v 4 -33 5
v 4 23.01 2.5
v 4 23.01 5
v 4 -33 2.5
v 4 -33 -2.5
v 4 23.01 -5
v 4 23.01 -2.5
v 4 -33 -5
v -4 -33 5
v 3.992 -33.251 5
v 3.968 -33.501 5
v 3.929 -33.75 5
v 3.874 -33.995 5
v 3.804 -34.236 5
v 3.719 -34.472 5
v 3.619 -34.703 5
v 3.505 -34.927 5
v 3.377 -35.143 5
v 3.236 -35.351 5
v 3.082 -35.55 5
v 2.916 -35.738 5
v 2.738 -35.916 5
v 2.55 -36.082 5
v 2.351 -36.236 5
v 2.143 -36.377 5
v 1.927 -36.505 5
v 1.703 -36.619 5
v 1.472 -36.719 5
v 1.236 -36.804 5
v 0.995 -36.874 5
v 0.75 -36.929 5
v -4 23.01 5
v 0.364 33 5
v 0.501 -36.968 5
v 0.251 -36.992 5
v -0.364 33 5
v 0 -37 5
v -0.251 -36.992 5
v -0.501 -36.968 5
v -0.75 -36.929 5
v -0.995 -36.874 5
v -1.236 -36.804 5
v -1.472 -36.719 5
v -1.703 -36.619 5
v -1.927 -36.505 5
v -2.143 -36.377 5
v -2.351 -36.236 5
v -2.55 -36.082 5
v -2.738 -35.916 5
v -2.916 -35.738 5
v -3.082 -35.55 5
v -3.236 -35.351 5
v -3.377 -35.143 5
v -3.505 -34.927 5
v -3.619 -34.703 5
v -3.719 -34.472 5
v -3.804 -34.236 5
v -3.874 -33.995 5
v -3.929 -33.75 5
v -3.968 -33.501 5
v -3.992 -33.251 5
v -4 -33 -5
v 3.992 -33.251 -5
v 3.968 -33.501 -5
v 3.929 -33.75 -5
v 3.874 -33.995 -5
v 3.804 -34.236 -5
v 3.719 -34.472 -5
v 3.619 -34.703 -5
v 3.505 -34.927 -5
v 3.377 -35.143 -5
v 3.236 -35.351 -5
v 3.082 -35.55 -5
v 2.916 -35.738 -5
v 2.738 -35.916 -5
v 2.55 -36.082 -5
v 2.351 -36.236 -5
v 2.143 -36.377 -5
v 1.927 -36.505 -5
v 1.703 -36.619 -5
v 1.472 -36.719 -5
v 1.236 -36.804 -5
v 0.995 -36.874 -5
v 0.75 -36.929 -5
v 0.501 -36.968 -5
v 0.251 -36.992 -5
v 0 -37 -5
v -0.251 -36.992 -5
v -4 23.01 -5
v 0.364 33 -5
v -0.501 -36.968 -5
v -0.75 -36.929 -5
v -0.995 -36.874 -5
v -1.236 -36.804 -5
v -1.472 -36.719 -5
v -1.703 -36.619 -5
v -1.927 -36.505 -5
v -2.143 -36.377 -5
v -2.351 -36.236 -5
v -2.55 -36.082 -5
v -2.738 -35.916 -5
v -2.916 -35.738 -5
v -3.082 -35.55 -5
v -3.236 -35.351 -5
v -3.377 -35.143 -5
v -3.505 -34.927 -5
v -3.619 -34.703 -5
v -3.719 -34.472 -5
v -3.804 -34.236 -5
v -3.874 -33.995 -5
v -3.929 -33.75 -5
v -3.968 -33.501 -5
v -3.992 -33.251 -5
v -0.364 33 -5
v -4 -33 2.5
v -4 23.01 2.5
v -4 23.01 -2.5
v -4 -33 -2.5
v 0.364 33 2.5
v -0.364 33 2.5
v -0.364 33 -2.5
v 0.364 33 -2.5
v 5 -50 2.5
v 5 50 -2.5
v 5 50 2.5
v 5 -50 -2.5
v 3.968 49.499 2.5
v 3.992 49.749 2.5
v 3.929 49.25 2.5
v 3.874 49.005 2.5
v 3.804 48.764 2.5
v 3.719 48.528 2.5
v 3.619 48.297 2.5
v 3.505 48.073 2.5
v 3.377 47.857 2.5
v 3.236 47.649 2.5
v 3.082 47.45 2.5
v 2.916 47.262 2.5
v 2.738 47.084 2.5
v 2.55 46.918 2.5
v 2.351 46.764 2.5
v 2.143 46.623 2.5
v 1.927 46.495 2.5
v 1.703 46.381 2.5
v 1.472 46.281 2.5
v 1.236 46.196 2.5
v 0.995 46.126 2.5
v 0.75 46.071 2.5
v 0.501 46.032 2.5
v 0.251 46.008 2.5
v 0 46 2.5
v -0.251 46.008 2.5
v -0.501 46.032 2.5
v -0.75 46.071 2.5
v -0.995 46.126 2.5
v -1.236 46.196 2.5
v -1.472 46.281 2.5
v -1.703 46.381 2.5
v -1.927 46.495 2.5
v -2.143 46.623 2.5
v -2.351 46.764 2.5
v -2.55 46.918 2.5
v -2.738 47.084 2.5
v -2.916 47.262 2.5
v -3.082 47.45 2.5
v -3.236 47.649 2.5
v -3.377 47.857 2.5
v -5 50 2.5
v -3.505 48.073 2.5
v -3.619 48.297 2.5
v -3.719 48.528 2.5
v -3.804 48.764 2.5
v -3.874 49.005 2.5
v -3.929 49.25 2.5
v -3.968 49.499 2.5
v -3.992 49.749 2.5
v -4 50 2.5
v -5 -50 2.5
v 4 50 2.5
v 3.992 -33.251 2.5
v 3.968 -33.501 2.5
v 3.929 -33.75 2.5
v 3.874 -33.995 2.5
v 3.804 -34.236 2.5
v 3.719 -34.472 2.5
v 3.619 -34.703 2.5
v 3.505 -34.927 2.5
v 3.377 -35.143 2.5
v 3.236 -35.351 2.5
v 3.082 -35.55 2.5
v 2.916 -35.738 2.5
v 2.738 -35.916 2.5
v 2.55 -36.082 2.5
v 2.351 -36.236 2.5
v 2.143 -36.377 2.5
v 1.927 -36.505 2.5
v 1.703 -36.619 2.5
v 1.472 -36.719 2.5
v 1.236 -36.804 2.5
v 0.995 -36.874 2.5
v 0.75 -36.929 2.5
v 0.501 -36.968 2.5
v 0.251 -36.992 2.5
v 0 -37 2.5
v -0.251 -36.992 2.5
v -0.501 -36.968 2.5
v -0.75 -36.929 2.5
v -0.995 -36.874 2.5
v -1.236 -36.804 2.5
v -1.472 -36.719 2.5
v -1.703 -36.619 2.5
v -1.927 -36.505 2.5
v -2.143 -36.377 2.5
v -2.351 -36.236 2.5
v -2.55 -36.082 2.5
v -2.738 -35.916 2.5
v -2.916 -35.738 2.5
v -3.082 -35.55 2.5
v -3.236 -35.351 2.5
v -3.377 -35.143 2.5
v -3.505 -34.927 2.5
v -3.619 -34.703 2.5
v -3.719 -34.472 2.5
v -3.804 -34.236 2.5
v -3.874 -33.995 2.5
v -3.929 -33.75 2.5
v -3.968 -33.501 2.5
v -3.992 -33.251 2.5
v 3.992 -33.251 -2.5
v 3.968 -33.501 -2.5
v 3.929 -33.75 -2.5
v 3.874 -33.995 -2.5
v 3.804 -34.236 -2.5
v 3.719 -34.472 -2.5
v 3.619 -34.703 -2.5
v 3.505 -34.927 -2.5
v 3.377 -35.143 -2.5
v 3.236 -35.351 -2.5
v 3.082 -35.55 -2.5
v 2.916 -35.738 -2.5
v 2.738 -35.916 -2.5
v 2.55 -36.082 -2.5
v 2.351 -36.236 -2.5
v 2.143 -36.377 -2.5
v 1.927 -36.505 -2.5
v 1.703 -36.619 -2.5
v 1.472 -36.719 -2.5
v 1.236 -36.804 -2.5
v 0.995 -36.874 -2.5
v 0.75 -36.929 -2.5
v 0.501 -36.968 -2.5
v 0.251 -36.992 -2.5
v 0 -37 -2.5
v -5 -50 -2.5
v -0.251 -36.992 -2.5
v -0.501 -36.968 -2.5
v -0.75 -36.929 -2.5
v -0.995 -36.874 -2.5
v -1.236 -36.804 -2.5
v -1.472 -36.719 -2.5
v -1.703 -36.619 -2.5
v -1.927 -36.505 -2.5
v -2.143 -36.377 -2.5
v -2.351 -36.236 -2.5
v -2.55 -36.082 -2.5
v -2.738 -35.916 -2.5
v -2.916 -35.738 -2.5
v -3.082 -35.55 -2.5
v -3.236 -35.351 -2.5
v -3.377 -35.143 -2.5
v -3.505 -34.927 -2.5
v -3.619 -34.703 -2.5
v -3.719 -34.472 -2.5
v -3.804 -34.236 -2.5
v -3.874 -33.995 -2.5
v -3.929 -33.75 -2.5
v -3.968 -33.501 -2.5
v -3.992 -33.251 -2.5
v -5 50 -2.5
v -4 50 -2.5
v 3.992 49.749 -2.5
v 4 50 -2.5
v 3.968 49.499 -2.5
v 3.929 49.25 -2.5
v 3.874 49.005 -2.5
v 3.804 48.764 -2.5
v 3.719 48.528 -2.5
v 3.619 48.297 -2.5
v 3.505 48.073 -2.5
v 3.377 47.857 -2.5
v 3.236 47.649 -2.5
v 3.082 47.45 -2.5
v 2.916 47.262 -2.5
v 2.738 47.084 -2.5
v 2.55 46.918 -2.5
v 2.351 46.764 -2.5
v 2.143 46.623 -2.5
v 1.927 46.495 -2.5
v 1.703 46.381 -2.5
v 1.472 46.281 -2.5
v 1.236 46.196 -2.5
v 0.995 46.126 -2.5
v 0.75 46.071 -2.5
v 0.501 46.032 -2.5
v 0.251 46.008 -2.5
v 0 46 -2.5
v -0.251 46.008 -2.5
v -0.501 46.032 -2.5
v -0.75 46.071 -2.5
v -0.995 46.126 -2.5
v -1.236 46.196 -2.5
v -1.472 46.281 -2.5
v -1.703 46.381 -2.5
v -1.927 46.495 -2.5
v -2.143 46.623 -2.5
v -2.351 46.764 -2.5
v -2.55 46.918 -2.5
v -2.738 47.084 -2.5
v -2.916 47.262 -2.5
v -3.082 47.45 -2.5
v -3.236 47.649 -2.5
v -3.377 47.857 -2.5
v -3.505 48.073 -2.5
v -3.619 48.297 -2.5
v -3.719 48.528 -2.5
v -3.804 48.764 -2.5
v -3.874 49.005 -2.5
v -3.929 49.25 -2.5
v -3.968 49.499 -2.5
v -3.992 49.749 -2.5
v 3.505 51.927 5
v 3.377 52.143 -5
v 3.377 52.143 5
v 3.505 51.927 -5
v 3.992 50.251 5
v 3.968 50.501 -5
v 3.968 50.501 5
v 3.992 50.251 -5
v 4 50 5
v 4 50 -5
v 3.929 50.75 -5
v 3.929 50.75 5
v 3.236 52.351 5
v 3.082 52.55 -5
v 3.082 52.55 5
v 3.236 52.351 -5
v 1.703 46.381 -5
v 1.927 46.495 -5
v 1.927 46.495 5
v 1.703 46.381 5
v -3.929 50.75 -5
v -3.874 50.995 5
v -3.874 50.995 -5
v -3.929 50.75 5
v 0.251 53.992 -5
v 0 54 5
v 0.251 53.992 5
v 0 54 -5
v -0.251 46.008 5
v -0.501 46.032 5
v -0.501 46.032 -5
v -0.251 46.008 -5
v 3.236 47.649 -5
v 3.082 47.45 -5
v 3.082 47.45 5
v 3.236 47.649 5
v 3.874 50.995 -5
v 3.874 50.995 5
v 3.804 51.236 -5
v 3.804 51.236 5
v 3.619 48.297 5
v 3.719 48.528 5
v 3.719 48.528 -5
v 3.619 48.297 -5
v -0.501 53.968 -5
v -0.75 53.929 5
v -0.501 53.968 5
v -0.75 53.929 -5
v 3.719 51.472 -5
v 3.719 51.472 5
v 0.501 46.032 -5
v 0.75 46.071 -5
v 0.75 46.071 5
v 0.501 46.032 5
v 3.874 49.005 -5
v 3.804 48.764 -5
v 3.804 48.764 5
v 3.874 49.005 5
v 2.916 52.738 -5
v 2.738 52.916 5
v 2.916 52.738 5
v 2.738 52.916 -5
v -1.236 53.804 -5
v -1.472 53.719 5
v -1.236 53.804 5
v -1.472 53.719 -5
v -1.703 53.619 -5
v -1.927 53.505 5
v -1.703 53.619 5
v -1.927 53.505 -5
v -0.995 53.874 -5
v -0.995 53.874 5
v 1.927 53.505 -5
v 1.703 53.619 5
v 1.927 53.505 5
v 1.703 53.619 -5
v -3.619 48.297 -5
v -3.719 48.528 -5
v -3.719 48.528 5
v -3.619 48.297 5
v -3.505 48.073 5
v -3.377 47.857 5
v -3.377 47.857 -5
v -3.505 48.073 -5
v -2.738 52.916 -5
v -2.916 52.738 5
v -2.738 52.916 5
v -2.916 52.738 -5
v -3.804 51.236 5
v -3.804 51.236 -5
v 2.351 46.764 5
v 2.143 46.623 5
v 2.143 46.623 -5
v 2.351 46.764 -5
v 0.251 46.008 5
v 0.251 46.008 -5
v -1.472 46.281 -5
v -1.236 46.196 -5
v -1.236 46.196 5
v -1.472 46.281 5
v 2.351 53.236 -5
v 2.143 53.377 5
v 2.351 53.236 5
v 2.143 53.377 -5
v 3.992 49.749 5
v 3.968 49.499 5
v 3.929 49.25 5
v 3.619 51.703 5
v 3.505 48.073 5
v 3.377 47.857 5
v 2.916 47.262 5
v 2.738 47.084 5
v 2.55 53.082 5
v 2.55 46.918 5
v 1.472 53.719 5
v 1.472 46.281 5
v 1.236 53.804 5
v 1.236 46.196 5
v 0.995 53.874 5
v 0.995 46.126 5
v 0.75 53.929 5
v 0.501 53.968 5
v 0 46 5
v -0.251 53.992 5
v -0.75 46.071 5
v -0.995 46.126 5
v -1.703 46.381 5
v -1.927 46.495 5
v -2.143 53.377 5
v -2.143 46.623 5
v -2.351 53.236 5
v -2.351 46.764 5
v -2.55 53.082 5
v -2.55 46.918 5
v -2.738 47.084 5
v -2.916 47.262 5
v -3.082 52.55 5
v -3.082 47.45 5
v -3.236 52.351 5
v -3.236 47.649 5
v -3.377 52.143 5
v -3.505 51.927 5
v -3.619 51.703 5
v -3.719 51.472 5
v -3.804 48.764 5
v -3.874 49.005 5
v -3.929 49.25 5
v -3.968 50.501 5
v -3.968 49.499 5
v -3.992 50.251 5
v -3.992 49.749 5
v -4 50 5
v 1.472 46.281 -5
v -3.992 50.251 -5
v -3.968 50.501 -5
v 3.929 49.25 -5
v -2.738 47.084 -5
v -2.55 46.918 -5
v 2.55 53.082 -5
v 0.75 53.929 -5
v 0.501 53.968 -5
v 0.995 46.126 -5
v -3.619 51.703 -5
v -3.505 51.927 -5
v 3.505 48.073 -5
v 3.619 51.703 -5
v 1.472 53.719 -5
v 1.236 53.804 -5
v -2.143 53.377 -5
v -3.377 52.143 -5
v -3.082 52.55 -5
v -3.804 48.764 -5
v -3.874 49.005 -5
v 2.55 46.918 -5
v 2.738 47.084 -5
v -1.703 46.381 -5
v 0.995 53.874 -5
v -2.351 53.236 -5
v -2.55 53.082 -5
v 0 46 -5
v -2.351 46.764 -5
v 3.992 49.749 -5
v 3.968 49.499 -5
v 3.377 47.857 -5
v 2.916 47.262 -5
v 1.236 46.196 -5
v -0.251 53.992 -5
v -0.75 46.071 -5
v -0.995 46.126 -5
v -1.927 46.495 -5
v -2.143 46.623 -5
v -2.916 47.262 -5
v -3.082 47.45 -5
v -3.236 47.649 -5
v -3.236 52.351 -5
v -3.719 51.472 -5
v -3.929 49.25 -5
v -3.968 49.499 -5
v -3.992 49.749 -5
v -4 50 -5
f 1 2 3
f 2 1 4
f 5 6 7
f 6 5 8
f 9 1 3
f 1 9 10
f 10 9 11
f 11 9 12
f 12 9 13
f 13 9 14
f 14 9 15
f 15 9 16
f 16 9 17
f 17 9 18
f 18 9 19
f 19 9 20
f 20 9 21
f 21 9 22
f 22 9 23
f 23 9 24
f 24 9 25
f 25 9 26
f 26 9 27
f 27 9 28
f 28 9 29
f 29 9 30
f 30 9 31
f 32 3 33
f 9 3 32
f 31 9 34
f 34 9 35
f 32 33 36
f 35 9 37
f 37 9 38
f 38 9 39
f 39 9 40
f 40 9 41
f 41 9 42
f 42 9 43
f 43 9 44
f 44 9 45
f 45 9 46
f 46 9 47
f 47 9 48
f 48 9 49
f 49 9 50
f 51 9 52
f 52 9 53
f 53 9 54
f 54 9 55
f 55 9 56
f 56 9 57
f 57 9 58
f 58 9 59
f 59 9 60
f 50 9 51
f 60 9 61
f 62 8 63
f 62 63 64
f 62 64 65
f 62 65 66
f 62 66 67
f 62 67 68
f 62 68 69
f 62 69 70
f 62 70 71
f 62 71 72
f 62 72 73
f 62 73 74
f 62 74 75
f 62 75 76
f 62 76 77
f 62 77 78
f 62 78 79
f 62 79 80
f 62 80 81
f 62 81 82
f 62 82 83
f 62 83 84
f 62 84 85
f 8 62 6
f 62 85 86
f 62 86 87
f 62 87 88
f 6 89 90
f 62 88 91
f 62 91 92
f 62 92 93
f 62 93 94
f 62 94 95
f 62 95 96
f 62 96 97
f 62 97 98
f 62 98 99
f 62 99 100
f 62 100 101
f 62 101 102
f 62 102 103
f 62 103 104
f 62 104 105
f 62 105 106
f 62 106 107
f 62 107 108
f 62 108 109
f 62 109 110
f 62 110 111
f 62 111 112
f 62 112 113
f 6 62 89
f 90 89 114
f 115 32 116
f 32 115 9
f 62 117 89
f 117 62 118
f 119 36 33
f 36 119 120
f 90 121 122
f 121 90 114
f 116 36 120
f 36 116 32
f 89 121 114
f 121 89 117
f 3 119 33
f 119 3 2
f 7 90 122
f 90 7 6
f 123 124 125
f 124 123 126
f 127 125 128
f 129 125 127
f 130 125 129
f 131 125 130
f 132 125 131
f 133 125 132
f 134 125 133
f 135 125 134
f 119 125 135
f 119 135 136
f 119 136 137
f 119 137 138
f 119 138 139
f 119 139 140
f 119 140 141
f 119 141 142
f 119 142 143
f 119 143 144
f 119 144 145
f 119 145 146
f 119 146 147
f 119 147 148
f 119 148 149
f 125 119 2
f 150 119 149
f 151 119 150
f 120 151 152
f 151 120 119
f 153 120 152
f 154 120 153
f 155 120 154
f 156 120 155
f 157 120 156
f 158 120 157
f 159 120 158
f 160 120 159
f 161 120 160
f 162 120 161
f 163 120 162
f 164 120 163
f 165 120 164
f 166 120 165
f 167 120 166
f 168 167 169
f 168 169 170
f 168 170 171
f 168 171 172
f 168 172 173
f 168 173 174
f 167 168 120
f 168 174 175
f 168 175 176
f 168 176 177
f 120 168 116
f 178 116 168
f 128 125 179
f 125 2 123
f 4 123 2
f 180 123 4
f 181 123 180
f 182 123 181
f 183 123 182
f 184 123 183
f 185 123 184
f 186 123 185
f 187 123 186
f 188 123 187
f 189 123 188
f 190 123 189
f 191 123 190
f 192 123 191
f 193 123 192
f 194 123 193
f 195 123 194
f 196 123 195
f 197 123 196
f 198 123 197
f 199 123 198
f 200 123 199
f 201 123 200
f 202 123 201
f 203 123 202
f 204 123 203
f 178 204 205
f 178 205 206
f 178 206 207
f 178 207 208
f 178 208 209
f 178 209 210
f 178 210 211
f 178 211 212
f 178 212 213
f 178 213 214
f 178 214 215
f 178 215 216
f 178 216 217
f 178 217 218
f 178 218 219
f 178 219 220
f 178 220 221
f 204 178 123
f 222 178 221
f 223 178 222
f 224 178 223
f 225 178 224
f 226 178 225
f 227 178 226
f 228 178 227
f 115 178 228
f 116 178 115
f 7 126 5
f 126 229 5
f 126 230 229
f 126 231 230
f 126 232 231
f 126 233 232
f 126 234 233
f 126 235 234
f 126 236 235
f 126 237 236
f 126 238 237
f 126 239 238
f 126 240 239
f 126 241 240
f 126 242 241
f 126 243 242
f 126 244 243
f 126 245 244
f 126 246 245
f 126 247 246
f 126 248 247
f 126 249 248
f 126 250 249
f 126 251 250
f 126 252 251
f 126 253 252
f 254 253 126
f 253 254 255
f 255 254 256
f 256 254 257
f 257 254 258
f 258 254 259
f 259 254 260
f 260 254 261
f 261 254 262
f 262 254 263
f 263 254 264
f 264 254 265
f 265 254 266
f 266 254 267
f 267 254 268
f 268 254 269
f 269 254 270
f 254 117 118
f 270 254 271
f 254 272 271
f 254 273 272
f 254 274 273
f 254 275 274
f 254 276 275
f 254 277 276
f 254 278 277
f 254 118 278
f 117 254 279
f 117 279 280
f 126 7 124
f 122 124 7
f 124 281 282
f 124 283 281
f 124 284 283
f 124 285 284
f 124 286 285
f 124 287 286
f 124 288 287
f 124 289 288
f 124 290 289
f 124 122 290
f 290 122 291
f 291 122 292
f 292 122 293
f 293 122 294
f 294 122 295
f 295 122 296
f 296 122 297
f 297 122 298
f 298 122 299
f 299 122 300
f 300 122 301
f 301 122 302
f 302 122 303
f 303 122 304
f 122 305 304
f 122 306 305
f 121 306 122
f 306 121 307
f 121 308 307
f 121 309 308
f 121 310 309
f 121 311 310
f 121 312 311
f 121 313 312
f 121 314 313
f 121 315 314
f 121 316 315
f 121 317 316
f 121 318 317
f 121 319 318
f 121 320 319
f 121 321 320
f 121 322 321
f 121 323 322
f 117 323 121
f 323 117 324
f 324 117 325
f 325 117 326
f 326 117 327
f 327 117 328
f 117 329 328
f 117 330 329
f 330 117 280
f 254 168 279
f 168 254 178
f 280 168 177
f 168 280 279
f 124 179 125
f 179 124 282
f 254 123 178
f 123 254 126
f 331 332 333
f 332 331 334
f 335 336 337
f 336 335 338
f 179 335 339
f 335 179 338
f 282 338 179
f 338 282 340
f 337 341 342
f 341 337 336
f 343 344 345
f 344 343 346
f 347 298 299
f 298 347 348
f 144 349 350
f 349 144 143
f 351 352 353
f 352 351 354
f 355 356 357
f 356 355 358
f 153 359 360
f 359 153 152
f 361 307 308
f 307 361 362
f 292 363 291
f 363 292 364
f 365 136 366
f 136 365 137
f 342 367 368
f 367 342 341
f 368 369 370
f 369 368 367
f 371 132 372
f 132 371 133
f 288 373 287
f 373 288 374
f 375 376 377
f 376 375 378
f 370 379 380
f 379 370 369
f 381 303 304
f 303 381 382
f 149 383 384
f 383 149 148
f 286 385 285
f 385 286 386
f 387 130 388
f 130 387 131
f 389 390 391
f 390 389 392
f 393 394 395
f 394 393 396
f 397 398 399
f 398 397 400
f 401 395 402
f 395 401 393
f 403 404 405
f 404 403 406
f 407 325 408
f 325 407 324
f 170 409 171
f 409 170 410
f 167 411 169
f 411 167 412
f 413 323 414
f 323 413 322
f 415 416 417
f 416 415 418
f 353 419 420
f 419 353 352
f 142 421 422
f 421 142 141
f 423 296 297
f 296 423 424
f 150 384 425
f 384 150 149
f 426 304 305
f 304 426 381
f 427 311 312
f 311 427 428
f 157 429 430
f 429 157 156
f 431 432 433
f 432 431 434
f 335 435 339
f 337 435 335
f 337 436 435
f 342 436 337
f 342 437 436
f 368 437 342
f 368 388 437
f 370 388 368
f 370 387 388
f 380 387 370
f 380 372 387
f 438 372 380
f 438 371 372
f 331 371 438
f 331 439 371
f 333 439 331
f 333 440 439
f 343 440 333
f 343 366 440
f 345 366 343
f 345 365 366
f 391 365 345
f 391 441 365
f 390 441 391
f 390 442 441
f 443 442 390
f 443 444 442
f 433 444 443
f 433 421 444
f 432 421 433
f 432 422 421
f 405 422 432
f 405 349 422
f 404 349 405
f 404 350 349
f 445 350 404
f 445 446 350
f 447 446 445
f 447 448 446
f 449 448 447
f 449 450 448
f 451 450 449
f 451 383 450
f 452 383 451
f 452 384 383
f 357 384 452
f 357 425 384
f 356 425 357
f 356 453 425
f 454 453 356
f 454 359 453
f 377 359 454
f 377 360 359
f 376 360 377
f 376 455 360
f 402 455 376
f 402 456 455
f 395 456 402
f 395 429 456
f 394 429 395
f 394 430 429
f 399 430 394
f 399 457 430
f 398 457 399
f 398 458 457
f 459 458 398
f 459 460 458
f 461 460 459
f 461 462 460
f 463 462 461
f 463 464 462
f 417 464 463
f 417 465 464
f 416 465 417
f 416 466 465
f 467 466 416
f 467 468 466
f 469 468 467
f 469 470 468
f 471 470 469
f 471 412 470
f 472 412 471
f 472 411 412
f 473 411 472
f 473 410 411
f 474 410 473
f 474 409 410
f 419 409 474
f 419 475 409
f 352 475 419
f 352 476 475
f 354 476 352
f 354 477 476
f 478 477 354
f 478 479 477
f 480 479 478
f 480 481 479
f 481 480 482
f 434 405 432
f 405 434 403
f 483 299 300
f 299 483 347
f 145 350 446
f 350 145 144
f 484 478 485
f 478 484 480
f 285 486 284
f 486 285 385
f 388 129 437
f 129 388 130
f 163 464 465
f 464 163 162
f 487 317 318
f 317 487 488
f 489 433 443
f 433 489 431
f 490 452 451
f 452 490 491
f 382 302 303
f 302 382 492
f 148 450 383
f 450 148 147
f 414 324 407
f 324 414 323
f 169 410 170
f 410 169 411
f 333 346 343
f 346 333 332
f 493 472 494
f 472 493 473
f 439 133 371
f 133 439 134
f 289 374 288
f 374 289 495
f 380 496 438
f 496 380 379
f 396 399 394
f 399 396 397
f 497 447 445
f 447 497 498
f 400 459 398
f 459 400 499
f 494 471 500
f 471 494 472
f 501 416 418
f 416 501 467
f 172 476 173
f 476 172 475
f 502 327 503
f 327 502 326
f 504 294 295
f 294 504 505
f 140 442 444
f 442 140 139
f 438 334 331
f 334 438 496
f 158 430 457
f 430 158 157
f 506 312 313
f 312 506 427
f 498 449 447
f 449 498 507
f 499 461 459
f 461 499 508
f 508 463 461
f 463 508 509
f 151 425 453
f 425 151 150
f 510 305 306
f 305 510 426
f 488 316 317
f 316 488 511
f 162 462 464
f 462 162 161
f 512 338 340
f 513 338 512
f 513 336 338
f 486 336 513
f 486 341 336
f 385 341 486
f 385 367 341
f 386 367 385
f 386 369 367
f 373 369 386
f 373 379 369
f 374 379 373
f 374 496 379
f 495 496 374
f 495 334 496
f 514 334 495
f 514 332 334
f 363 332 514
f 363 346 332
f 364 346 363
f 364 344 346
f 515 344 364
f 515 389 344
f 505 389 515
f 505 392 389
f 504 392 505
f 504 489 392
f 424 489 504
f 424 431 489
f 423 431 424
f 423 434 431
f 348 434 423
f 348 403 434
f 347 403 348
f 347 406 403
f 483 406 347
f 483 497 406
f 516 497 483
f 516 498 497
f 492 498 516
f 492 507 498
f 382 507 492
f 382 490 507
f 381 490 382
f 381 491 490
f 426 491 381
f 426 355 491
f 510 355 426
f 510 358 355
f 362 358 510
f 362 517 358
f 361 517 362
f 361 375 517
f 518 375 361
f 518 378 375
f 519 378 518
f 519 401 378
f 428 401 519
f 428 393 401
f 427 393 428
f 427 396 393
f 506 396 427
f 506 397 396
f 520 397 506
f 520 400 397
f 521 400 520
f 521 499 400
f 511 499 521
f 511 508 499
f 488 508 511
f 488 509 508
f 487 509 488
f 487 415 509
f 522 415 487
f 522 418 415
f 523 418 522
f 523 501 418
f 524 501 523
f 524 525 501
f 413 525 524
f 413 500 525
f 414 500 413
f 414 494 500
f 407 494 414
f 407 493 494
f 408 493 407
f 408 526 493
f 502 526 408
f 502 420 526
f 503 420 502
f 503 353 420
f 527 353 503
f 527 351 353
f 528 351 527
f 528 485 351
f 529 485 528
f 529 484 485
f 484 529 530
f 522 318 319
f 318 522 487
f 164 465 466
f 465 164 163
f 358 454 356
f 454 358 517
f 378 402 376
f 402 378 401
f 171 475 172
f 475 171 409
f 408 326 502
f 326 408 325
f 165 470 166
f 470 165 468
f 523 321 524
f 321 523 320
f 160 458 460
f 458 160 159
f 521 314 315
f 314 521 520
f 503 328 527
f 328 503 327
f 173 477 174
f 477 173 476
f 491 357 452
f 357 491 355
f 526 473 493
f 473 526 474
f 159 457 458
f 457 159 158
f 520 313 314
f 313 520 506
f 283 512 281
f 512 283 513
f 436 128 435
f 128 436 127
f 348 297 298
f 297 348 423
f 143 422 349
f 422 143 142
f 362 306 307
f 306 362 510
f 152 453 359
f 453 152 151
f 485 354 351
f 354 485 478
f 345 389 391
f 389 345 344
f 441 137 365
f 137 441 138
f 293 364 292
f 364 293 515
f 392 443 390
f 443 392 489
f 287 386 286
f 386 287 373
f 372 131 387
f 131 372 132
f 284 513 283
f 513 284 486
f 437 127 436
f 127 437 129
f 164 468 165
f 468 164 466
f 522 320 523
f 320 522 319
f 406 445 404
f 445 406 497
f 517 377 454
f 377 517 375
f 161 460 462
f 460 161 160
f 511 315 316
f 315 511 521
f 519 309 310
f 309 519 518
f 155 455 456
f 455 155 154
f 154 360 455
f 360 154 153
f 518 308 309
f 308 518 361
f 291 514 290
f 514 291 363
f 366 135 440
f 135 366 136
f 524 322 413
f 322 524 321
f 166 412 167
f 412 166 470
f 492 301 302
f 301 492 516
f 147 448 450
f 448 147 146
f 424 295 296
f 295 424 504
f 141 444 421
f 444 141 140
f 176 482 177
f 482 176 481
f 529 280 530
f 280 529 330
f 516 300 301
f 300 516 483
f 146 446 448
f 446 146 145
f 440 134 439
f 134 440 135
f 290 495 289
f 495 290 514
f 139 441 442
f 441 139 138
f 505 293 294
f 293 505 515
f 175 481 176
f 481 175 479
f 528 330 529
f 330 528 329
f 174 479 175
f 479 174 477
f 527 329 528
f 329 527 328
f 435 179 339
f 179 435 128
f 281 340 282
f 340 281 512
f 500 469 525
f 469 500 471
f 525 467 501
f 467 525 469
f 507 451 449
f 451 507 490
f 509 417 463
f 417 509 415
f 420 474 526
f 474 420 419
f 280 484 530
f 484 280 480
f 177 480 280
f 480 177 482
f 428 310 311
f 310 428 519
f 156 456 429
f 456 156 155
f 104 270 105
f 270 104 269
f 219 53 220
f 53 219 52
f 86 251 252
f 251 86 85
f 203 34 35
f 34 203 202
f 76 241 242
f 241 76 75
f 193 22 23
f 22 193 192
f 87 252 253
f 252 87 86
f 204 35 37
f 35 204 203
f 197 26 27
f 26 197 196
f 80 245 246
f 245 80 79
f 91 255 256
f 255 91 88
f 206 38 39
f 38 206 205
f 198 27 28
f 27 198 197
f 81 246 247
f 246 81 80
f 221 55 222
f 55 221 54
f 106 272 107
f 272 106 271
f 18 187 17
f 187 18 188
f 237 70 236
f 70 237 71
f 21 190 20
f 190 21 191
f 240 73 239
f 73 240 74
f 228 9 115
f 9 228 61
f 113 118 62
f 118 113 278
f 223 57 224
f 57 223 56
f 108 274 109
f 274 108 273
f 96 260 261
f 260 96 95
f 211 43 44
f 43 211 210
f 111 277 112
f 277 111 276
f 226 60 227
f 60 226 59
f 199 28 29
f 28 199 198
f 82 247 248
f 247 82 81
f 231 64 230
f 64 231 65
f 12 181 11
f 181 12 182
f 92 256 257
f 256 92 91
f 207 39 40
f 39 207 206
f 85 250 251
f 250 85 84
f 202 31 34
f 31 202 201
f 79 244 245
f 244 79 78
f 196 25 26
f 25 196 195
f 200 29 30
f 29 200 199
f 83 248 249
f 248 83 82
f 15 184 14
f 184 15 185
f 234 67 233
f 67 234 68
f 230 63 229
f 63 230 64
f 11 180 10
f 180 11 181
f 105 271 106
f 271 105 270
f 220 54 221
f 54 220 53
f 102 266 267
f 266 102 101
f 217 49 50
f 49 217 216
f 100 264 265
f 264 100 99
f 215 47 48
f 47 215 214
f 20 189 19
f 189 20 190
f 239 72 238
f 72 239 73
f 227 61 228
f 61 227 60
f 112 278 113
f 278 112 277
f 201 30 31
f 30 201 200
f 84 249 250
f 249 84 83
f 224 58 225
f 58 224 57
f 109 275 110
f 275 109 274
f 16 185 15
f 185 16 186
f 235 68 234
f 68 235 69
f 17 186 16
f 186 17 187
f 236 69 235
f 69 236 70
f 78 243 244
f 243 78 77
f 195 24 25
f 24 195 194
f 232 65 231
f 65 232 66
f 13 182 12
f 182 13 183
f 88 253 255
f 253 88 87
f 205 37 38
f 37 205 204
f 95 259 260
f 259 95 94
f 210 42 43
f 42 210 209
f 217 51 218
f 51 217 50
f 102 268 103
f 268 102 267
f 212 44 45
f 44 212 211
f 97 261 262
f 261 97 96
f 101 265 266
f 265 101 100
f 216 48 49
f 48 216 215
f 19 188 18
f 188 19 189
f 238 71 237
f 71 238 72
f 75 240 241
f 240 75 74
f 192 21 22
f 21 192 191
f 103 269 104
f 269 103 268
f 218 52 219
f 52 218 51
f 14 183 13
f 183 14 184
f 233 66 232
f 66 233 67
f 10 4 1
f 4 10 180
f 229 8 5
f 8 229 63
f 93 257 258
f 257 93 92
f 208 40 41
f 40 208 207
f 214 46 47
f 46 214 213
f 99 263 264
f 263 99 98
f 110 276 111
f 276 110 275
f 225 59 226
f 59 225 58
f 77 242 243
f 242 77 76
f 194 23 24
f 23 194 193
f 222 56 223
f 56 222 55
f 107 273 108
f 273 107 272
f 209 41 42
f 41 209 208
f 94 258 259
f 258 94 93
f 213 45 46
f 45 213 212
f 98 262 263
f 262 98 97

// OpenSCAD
$fn = 100;

*union() {
    difference() {
        translate([-6.1,-.2,0])
        linear_extrude(height = 5, center = true)
        import(file = "thread-release-clip.dxf");
        
        #translate([0,58,0])
        cube([1,10,10], center = true);
    }
    
    translate([0,-15,0])
    cube([30,30,5], center = true);
}


clip_width = 10;
clip_height = 100;
clip_thickness = 5;
cube([clip_width, clip_height, clip_thickness], center = true);

flexure_thickness = 1;
curve_diameter = clip_width - 2*flexure_thickness;
center_cutout_height = clip_height - 50;
release_wedge_height = 20;
center_cutout_box_height =
    center_cutout_height
    - 0.5*curve_diameter
    + release_wedge_height;

translate([0,clip_height/2,0])
cylinder(d = curve_diameter, h = 2*clip_thickness, center = true);

difference() {
    cube([clip_width - 2*flexure_thickness,
          center_cutout_box_height,
          2*clip_thickness],
         center = true);
    
    translate([0,center_cutout_box_height/2 + 1,0])
    rotate([0,0,-20])
    translate([-25,0,0])
    cube([50,50,50], center = true);
    
    translate([0,center_cutout_box_height/2 + 1,0])
    rotate([0,0,20])
    translate([25,0,0])
    cube([50,50,50], center = true);
}

translate([0,-center_cutout_box_height/2,0])
cylinder(d = curve_diameter, h = 2*clip_thickness, center = true);
